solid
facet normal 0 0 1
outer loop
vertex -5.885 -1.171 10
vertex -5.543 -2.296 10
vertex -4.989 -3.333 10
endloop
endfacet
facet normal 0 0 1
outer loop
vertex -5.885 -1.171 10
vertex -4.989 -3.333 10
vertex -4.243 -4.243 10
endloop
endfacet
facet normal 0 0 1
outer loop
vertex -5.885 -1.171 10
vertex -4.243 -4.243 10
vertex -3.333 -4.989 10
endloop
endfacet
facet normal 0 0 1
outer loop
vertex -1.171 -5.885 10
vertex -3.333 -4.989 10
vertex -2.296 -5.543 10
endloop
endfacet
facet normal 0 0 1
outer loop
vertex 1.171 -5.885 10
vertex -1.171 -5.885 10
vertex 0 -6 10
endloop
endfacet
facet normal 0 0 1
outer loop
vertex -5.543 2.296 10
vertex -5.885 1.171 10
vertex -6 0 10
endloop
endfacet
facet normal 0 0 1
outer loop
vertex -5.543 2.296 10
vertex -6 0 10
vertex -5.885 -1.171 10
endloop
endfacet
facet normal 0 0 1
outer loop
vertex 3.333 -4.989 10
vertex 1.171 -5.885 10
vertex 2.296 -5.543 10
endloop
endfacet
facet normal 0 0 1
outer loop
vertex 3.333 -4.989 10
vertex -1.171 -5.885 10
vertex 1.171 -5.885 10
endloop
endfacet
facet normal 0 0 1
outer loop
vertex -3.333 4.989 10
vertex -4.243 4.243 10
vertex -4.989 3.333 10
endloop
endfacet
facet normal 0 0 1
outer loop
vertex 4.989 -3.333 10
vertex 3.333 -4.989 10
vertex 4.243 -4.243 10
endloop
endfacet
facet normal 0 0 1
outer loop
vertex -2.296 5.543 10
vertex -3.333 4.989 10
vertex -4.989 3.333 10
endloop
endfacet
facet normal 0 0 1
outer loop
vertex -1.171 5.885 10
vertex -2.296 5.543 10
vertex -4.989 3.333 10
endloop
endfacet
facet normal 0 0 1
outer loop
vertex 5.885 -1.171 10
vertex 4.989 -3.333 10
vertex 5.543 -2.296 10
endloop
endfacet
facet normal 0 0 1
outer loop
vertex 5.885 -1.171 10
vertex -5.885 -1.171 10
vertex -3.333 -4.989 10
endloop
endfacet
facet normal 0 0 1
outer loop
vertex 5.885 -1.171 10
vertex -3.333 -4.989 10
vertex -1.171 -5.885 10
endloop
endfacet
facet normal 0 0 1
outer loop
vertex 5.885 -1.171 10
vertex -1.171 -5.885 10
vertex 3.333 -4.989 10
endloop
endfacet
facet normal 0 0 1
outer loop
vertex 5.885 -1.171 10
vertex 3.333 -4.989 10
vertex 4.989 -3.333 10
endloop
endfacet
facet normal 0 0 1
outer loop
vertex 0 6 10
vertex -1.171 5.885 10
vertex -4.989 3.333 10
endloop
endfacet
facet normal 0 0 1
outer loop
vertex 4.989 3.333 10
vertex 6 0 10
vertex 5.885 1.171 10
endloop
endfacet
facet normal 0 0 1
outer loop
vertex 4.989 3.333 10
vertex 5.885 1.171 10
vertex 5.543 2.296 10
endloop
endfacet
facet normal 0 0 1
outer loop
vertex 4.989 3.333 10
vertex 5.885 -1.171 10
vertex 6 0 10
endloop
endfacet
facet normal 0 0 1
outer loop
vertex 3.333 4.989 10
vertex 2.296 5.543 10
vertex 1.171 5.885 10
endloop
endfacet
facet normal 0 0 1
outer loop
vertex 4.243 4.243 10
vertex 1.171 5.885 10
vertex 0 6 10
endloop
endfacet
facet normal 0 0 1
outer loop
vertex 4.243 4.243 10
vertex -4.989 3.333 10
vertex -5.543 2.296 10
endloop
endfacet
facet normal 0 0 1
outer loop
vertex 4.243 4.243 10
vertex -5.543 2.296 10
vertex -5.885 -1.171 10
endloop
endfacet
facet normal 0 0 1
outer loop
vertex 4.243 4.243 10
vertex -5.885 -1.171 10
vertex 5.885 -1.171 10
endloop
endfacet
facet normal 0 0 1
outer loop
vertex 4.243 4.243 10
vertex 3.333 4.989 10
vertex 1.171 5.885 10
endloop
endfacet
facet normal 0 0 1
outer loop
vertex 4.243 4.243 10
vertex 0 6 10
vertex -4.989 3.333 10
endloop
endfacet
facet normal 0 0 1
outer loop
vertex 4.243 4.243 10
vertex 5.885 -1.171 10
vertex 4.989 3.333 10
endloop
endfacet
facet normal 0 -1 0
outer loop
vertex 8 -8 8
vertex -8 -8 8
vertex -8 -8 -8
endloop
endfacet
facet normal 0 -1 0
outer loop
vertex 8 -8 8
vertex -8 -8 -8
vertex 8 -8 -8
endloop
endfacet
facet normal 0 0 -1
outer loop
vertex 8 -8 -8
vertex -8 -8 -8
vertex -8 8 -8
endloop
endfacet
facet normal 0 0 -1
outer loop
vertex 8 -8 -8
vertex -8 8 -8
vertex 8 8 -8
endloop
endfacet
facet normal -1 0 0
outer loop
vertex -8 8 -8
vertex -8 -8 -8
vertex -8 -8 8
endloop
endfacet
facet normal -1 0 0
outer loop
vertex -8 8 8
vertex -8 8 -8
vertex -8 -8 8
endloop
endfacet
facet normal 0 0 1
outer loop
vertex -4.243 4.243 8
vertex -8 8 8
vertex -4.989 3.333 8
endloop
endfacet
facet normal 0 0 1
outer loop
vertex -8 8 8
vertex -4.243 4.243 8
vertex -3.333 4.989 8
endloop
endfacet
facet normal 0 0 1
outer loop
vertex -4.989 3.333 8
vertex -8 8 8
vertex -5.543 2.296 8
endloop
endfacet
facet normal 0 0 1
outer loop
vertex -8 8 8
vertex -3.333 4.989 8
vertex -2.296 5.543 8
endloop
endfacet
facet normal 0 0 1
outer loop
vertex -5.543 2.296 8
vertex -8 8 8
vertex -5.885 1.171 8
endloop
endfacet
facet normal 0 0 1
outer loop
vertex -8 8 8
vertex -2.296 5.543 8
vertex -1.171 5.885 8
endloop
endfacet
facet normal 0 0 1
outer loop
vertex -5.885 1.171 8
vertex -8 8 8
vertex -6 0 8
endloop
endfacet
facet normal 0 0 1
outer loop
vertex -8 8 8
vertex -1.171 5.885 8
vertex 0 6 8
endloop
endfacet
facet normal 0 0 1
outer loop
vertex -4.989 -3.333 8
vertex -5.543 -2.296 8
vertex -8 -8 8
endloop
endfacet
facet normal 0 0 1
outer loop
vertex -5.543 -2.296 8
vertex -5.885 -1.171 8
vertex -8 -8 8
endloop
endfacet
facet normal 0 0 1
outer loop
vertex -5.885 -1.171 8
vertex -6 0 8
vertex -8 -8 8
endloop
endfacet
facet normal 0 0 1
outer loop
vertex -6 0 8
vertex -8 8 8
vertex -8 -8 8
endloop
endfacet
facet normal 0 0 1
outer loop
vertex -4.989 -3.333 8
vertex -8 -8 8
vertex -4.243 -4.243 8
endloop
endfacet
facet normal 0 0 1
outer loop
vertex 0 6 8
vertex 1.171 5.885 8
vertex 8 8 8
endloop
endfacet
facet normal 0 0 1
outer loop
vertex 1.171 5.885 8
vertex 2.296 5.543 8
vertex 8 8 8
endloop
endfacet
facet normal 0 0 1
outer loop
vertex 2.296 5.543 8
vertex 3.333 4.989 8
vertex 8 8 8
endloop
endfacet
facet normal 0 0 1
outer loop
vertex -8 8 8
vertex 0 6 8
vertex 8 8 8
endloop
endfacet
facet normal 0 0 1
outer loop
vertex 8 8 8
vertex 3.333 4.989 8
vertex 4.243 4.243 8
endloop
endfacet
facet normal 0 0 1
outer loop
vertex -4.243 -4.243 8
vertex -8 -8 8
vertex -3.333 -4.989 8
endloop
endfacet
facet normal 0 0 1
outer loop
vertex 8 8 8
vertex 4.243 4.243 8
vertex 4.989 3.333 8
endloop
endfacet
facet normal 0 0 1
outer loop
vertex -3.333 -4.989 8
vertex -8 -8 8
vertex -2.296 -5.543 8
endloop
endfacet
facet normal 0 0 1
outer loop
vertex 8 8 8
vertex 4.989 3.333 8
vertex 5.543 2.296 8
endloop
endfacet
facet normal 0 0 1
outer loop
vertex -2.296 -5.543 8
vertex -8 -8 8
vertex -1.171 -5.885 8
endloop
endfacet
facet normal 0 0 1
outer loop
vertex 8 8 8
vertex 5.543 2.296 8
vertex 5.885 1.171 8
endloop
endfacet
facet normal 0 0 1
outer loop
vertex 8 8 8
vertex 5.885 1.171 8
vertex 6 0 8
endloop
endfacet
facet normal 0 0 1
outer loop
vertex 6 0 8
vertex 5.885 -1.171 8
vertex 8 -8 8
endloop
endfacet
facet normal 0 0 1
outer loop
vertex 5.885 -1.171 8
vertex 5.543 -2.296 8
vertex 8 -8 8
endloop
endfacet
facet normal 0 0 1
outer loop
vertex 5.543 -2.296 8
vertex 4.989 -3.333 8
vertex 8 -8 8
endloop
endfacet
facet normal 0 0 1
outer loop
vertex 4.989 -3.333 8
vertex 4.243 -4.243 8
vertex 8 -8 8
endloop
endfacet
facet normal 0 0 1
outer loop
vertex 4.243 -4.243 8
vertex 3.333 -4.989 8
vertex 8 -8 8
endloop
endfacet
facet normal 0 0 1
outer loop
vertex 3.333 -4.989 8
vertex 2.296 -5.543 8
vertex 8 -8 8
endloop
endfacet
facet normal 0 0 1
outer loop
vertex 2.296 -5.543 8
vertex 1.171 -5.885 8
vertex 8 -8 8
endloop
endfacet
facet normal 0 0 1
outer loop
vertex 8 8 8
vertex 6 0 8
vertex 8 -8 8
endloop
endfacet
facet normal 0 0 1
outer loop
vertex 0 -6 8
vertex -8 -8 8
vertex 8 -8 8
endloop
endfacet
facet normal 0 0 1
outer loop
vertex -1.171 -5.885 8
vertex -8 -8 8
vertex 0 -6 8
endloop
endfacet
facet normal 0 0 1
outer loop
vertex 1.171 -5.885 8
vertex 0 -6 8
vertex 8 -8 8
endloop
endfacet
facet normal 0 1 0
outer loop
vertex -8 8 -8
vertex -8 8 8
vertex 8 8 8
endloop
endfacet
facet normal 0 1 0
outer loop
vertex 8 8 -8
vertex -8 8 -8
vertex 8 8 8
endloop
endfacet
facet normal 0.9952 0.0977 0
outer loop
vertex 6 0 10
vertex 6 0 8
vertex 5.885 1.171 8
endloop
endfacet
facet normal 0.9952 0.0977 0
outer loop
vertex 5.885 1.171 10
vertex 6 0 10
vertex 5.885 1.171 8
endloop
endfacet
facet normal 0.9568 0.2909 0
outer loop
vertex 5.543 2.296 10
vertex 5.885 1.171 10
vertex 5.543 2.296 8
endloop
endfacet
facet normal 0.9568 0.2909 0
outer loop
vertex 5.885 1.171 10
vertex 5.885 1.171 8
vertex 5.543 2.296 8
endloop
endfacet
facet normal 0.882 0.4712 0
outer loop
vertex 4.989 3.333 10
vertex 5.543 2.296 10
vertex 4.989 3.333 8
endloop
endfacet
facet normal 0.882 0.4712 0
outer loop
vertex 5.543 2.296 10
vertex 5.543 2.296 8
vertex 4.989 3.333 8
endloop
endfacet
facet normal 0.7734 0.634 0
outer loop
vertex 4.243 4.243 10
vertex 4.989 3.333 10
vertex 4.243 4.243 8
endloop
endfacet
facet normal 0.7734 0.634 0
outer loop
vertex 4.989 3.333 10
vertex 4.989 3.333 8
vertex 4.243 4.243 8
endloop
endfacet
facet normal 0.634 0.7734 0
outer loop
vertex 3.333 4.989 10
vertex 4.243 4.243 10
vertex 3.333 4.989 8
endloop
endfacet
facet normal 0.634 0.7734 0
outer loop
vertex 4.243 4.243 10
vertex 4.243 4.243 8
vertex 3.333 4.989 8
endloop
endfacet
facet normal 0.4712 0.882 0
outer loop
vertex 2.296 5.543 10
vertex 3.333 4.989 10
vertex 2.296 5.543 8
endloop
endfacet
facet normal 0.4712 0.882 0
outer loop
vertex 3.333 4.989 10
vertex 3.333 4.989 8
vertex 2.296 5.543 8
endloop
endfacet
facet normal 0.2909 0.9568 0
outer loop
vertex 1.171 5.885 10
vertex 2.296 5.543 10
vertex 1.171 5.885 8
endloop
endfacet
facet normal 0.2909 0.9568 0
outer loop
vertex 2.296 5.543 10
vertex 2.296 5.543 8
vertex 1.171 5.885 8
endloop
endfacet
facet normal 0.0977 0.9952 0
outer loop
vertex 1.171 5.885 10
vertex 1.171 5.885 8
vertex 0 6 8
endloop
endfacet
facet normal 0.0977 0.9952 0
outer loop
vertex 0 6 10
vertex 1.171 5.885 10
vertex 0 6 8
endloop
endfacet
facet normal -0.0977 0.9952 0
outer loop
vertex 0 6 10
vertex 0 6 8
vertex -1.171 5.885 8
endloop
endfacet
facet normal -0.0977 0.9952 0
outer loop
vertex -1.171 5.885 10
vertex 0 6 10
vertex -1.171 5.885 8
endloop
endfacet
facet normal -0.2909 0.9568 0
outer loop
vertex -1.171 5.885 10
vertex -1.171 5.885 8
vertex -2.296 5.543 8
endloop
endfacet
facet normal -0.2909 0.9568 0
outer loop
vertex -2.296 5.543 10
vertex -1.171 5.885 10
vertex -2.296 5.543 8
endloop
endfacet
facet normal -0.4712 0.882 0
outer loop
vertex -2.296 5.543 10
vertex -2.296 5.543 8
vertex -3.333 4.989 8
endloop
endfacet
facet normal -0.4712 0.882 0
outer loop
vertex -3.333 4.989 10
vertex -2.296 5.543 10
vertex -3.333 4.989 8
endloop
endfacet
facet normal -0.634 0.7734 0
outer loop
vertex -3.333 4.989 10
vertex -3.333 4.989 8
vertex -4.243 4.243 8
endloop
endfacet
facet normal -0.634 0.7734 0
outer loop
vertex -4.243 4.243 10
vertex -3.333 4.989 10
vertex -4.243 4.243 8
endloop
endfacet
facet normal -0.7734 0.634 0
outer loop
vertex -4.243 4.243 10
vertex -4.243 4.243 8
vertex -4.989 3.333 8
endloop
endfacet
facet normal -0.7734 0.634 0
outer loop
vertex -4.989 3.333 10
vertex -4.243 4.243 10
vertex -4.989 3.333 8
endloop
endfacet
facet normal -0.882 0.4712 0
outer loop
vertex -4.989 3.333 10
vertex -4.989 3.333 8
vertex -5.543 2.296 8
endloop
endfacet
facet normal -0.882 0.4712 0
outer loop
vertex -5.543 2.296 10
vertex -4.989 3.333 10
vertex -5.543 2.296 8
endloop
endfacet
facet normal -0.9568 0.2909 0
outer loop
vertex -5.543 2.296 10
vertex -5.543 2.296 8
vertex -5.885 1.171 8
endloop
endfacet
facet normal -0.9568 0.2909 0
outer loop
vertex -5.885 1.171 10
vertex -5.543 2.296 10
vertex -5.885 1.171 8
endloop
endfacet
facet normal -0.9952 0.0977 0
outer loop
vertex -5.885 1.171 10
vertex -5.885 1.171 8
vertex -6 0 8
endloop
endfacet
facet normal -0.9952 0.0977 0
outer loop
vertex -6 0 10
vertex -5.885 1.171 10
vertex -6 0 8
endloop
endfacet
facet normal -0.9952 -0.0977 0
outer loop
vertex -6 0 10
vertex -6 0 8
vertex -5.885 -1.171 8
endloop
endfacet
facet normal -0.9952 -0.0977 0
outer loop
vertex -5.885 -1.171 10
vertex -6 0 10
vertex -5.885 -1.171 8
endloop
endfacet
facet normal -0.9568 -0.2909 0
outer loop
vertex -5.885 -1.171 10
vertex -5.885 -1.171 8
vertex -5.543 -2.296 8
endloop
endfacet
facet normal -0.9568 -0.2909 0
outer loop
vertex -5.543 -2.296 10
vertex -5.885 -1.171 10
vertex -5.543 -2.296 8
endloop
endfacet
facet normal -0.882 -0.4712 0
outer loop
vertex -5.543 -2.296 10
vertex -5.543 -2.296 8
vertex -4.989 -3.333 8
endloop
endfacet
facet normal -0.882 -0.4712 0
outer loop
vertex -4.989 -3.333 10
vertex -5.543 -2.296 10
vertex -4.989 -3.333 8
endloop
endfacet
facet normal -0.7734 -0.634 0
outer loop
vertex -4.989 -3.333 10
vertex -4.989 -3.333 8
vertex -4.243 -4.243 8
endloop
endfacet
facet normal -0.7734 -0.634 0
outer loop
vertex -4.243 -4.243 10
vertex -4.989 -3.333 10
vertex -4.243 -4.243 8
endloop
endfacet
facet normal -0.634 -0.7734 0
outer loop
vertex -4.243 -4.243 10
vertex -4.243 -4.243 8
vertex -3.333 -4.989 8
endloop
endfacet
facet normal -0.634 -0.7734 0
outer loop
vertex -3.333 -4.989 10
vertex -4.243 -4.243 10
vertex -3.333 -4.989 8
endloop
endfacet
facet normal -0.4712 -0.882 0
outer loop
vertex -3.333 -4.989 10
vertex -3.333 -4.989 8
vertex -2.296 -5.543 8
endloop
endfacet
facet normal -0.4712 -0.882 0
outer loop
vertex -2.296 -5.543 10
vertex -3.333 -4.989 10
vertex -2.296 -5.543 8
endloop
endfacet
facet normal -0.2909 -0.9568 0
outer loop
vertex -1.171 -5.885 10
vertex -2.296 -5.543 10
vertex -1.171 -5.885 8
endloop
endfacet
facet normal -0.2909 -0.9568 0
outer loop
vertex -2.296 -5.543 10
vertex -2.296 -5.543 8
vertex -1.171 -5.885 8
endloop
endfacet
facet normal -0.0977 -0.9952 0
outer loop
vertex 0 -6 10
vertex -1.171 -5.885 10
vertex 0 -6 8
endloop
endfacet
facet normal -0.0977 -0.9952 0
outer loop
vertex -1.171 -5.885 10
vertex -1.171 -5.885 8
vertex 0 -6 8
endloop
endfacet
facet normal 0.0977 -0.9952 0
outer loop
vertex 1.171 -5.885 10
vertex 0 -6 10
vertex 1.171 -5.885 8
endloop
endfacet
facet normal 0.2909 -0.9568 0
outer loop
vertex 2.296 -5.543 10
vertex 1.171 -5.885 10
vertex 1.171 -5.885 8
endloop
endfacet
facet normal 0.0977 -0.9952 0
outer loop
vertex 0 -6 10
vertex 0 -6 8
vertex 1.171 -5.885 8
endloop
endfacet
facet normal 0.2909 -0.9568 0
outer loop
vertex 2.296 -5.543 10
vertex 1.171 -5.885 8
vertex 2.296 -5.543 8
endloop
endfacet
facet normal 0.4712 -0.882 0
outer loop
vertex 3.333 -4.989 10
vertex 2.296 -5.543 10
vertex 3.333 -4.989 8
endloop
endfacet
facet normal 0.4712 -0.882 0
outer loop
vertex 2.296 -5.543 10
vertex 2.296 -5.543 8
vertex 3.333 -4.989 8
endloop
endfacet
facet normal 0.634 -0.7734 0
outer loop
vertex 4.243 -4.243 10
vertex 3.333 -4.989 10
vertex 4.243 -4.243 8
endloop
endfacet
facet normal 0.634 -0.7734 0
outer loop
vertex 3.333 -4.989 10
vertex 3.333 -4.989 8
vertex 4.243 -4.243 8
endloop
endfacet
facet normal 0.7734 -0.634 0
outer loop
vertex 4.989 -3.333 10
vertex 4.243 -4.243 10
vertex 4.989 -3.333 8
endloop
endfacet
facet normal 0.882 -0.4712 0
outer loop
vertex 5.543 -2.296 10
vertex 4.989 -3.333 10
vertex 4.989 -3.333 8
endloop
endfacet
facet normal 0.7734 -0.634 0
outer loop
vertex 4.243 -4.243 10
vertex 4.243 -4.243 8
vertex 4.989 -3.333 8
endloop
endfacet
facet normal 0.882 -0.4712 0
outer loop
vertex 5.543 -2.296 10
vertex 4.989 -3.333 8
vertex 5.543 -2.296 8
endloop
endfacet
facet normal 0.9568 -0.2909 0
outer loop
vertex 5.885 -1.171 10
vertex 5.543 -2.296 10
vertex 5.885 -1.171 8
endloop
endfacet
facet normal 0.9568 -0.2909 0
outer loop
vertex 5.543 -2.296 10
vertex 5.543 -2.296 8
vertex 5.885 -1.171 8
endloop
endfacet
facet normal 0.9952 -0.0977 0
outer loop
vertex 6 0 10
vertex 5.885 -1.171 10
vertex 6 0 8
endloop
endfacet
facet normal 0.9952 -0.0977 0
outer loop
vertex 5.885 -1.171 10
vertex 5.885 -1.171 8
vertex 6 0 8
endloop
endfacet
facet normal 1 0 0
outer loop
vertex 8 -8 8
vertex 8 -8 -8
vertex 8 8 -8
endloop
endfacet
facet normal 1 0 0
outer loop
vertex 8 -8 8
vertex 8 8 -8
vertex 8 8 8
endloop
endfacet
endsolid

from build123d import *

# Parameters (mm, degrees)
F0_W     = 16
F0_H     = 16
F1_DEPTH = 8
F2_R     = 6
F3_DEPTH = 10


with BuildPart() as f1:
    # F0 (on Front) → F1 (new body, symmetric)
    with BuildSketch(Plane.XZ):
        Rectangle(F0_W, F0_H)
    extrude(amount=F1_DEPTH, both=True)

    # F2 (on Top) → F3 (join)
    with BuildSketch(Plane.XY):
        Circle(F2_R)
    extrude(amount=F3_DEPTH)


solid = f1.part
